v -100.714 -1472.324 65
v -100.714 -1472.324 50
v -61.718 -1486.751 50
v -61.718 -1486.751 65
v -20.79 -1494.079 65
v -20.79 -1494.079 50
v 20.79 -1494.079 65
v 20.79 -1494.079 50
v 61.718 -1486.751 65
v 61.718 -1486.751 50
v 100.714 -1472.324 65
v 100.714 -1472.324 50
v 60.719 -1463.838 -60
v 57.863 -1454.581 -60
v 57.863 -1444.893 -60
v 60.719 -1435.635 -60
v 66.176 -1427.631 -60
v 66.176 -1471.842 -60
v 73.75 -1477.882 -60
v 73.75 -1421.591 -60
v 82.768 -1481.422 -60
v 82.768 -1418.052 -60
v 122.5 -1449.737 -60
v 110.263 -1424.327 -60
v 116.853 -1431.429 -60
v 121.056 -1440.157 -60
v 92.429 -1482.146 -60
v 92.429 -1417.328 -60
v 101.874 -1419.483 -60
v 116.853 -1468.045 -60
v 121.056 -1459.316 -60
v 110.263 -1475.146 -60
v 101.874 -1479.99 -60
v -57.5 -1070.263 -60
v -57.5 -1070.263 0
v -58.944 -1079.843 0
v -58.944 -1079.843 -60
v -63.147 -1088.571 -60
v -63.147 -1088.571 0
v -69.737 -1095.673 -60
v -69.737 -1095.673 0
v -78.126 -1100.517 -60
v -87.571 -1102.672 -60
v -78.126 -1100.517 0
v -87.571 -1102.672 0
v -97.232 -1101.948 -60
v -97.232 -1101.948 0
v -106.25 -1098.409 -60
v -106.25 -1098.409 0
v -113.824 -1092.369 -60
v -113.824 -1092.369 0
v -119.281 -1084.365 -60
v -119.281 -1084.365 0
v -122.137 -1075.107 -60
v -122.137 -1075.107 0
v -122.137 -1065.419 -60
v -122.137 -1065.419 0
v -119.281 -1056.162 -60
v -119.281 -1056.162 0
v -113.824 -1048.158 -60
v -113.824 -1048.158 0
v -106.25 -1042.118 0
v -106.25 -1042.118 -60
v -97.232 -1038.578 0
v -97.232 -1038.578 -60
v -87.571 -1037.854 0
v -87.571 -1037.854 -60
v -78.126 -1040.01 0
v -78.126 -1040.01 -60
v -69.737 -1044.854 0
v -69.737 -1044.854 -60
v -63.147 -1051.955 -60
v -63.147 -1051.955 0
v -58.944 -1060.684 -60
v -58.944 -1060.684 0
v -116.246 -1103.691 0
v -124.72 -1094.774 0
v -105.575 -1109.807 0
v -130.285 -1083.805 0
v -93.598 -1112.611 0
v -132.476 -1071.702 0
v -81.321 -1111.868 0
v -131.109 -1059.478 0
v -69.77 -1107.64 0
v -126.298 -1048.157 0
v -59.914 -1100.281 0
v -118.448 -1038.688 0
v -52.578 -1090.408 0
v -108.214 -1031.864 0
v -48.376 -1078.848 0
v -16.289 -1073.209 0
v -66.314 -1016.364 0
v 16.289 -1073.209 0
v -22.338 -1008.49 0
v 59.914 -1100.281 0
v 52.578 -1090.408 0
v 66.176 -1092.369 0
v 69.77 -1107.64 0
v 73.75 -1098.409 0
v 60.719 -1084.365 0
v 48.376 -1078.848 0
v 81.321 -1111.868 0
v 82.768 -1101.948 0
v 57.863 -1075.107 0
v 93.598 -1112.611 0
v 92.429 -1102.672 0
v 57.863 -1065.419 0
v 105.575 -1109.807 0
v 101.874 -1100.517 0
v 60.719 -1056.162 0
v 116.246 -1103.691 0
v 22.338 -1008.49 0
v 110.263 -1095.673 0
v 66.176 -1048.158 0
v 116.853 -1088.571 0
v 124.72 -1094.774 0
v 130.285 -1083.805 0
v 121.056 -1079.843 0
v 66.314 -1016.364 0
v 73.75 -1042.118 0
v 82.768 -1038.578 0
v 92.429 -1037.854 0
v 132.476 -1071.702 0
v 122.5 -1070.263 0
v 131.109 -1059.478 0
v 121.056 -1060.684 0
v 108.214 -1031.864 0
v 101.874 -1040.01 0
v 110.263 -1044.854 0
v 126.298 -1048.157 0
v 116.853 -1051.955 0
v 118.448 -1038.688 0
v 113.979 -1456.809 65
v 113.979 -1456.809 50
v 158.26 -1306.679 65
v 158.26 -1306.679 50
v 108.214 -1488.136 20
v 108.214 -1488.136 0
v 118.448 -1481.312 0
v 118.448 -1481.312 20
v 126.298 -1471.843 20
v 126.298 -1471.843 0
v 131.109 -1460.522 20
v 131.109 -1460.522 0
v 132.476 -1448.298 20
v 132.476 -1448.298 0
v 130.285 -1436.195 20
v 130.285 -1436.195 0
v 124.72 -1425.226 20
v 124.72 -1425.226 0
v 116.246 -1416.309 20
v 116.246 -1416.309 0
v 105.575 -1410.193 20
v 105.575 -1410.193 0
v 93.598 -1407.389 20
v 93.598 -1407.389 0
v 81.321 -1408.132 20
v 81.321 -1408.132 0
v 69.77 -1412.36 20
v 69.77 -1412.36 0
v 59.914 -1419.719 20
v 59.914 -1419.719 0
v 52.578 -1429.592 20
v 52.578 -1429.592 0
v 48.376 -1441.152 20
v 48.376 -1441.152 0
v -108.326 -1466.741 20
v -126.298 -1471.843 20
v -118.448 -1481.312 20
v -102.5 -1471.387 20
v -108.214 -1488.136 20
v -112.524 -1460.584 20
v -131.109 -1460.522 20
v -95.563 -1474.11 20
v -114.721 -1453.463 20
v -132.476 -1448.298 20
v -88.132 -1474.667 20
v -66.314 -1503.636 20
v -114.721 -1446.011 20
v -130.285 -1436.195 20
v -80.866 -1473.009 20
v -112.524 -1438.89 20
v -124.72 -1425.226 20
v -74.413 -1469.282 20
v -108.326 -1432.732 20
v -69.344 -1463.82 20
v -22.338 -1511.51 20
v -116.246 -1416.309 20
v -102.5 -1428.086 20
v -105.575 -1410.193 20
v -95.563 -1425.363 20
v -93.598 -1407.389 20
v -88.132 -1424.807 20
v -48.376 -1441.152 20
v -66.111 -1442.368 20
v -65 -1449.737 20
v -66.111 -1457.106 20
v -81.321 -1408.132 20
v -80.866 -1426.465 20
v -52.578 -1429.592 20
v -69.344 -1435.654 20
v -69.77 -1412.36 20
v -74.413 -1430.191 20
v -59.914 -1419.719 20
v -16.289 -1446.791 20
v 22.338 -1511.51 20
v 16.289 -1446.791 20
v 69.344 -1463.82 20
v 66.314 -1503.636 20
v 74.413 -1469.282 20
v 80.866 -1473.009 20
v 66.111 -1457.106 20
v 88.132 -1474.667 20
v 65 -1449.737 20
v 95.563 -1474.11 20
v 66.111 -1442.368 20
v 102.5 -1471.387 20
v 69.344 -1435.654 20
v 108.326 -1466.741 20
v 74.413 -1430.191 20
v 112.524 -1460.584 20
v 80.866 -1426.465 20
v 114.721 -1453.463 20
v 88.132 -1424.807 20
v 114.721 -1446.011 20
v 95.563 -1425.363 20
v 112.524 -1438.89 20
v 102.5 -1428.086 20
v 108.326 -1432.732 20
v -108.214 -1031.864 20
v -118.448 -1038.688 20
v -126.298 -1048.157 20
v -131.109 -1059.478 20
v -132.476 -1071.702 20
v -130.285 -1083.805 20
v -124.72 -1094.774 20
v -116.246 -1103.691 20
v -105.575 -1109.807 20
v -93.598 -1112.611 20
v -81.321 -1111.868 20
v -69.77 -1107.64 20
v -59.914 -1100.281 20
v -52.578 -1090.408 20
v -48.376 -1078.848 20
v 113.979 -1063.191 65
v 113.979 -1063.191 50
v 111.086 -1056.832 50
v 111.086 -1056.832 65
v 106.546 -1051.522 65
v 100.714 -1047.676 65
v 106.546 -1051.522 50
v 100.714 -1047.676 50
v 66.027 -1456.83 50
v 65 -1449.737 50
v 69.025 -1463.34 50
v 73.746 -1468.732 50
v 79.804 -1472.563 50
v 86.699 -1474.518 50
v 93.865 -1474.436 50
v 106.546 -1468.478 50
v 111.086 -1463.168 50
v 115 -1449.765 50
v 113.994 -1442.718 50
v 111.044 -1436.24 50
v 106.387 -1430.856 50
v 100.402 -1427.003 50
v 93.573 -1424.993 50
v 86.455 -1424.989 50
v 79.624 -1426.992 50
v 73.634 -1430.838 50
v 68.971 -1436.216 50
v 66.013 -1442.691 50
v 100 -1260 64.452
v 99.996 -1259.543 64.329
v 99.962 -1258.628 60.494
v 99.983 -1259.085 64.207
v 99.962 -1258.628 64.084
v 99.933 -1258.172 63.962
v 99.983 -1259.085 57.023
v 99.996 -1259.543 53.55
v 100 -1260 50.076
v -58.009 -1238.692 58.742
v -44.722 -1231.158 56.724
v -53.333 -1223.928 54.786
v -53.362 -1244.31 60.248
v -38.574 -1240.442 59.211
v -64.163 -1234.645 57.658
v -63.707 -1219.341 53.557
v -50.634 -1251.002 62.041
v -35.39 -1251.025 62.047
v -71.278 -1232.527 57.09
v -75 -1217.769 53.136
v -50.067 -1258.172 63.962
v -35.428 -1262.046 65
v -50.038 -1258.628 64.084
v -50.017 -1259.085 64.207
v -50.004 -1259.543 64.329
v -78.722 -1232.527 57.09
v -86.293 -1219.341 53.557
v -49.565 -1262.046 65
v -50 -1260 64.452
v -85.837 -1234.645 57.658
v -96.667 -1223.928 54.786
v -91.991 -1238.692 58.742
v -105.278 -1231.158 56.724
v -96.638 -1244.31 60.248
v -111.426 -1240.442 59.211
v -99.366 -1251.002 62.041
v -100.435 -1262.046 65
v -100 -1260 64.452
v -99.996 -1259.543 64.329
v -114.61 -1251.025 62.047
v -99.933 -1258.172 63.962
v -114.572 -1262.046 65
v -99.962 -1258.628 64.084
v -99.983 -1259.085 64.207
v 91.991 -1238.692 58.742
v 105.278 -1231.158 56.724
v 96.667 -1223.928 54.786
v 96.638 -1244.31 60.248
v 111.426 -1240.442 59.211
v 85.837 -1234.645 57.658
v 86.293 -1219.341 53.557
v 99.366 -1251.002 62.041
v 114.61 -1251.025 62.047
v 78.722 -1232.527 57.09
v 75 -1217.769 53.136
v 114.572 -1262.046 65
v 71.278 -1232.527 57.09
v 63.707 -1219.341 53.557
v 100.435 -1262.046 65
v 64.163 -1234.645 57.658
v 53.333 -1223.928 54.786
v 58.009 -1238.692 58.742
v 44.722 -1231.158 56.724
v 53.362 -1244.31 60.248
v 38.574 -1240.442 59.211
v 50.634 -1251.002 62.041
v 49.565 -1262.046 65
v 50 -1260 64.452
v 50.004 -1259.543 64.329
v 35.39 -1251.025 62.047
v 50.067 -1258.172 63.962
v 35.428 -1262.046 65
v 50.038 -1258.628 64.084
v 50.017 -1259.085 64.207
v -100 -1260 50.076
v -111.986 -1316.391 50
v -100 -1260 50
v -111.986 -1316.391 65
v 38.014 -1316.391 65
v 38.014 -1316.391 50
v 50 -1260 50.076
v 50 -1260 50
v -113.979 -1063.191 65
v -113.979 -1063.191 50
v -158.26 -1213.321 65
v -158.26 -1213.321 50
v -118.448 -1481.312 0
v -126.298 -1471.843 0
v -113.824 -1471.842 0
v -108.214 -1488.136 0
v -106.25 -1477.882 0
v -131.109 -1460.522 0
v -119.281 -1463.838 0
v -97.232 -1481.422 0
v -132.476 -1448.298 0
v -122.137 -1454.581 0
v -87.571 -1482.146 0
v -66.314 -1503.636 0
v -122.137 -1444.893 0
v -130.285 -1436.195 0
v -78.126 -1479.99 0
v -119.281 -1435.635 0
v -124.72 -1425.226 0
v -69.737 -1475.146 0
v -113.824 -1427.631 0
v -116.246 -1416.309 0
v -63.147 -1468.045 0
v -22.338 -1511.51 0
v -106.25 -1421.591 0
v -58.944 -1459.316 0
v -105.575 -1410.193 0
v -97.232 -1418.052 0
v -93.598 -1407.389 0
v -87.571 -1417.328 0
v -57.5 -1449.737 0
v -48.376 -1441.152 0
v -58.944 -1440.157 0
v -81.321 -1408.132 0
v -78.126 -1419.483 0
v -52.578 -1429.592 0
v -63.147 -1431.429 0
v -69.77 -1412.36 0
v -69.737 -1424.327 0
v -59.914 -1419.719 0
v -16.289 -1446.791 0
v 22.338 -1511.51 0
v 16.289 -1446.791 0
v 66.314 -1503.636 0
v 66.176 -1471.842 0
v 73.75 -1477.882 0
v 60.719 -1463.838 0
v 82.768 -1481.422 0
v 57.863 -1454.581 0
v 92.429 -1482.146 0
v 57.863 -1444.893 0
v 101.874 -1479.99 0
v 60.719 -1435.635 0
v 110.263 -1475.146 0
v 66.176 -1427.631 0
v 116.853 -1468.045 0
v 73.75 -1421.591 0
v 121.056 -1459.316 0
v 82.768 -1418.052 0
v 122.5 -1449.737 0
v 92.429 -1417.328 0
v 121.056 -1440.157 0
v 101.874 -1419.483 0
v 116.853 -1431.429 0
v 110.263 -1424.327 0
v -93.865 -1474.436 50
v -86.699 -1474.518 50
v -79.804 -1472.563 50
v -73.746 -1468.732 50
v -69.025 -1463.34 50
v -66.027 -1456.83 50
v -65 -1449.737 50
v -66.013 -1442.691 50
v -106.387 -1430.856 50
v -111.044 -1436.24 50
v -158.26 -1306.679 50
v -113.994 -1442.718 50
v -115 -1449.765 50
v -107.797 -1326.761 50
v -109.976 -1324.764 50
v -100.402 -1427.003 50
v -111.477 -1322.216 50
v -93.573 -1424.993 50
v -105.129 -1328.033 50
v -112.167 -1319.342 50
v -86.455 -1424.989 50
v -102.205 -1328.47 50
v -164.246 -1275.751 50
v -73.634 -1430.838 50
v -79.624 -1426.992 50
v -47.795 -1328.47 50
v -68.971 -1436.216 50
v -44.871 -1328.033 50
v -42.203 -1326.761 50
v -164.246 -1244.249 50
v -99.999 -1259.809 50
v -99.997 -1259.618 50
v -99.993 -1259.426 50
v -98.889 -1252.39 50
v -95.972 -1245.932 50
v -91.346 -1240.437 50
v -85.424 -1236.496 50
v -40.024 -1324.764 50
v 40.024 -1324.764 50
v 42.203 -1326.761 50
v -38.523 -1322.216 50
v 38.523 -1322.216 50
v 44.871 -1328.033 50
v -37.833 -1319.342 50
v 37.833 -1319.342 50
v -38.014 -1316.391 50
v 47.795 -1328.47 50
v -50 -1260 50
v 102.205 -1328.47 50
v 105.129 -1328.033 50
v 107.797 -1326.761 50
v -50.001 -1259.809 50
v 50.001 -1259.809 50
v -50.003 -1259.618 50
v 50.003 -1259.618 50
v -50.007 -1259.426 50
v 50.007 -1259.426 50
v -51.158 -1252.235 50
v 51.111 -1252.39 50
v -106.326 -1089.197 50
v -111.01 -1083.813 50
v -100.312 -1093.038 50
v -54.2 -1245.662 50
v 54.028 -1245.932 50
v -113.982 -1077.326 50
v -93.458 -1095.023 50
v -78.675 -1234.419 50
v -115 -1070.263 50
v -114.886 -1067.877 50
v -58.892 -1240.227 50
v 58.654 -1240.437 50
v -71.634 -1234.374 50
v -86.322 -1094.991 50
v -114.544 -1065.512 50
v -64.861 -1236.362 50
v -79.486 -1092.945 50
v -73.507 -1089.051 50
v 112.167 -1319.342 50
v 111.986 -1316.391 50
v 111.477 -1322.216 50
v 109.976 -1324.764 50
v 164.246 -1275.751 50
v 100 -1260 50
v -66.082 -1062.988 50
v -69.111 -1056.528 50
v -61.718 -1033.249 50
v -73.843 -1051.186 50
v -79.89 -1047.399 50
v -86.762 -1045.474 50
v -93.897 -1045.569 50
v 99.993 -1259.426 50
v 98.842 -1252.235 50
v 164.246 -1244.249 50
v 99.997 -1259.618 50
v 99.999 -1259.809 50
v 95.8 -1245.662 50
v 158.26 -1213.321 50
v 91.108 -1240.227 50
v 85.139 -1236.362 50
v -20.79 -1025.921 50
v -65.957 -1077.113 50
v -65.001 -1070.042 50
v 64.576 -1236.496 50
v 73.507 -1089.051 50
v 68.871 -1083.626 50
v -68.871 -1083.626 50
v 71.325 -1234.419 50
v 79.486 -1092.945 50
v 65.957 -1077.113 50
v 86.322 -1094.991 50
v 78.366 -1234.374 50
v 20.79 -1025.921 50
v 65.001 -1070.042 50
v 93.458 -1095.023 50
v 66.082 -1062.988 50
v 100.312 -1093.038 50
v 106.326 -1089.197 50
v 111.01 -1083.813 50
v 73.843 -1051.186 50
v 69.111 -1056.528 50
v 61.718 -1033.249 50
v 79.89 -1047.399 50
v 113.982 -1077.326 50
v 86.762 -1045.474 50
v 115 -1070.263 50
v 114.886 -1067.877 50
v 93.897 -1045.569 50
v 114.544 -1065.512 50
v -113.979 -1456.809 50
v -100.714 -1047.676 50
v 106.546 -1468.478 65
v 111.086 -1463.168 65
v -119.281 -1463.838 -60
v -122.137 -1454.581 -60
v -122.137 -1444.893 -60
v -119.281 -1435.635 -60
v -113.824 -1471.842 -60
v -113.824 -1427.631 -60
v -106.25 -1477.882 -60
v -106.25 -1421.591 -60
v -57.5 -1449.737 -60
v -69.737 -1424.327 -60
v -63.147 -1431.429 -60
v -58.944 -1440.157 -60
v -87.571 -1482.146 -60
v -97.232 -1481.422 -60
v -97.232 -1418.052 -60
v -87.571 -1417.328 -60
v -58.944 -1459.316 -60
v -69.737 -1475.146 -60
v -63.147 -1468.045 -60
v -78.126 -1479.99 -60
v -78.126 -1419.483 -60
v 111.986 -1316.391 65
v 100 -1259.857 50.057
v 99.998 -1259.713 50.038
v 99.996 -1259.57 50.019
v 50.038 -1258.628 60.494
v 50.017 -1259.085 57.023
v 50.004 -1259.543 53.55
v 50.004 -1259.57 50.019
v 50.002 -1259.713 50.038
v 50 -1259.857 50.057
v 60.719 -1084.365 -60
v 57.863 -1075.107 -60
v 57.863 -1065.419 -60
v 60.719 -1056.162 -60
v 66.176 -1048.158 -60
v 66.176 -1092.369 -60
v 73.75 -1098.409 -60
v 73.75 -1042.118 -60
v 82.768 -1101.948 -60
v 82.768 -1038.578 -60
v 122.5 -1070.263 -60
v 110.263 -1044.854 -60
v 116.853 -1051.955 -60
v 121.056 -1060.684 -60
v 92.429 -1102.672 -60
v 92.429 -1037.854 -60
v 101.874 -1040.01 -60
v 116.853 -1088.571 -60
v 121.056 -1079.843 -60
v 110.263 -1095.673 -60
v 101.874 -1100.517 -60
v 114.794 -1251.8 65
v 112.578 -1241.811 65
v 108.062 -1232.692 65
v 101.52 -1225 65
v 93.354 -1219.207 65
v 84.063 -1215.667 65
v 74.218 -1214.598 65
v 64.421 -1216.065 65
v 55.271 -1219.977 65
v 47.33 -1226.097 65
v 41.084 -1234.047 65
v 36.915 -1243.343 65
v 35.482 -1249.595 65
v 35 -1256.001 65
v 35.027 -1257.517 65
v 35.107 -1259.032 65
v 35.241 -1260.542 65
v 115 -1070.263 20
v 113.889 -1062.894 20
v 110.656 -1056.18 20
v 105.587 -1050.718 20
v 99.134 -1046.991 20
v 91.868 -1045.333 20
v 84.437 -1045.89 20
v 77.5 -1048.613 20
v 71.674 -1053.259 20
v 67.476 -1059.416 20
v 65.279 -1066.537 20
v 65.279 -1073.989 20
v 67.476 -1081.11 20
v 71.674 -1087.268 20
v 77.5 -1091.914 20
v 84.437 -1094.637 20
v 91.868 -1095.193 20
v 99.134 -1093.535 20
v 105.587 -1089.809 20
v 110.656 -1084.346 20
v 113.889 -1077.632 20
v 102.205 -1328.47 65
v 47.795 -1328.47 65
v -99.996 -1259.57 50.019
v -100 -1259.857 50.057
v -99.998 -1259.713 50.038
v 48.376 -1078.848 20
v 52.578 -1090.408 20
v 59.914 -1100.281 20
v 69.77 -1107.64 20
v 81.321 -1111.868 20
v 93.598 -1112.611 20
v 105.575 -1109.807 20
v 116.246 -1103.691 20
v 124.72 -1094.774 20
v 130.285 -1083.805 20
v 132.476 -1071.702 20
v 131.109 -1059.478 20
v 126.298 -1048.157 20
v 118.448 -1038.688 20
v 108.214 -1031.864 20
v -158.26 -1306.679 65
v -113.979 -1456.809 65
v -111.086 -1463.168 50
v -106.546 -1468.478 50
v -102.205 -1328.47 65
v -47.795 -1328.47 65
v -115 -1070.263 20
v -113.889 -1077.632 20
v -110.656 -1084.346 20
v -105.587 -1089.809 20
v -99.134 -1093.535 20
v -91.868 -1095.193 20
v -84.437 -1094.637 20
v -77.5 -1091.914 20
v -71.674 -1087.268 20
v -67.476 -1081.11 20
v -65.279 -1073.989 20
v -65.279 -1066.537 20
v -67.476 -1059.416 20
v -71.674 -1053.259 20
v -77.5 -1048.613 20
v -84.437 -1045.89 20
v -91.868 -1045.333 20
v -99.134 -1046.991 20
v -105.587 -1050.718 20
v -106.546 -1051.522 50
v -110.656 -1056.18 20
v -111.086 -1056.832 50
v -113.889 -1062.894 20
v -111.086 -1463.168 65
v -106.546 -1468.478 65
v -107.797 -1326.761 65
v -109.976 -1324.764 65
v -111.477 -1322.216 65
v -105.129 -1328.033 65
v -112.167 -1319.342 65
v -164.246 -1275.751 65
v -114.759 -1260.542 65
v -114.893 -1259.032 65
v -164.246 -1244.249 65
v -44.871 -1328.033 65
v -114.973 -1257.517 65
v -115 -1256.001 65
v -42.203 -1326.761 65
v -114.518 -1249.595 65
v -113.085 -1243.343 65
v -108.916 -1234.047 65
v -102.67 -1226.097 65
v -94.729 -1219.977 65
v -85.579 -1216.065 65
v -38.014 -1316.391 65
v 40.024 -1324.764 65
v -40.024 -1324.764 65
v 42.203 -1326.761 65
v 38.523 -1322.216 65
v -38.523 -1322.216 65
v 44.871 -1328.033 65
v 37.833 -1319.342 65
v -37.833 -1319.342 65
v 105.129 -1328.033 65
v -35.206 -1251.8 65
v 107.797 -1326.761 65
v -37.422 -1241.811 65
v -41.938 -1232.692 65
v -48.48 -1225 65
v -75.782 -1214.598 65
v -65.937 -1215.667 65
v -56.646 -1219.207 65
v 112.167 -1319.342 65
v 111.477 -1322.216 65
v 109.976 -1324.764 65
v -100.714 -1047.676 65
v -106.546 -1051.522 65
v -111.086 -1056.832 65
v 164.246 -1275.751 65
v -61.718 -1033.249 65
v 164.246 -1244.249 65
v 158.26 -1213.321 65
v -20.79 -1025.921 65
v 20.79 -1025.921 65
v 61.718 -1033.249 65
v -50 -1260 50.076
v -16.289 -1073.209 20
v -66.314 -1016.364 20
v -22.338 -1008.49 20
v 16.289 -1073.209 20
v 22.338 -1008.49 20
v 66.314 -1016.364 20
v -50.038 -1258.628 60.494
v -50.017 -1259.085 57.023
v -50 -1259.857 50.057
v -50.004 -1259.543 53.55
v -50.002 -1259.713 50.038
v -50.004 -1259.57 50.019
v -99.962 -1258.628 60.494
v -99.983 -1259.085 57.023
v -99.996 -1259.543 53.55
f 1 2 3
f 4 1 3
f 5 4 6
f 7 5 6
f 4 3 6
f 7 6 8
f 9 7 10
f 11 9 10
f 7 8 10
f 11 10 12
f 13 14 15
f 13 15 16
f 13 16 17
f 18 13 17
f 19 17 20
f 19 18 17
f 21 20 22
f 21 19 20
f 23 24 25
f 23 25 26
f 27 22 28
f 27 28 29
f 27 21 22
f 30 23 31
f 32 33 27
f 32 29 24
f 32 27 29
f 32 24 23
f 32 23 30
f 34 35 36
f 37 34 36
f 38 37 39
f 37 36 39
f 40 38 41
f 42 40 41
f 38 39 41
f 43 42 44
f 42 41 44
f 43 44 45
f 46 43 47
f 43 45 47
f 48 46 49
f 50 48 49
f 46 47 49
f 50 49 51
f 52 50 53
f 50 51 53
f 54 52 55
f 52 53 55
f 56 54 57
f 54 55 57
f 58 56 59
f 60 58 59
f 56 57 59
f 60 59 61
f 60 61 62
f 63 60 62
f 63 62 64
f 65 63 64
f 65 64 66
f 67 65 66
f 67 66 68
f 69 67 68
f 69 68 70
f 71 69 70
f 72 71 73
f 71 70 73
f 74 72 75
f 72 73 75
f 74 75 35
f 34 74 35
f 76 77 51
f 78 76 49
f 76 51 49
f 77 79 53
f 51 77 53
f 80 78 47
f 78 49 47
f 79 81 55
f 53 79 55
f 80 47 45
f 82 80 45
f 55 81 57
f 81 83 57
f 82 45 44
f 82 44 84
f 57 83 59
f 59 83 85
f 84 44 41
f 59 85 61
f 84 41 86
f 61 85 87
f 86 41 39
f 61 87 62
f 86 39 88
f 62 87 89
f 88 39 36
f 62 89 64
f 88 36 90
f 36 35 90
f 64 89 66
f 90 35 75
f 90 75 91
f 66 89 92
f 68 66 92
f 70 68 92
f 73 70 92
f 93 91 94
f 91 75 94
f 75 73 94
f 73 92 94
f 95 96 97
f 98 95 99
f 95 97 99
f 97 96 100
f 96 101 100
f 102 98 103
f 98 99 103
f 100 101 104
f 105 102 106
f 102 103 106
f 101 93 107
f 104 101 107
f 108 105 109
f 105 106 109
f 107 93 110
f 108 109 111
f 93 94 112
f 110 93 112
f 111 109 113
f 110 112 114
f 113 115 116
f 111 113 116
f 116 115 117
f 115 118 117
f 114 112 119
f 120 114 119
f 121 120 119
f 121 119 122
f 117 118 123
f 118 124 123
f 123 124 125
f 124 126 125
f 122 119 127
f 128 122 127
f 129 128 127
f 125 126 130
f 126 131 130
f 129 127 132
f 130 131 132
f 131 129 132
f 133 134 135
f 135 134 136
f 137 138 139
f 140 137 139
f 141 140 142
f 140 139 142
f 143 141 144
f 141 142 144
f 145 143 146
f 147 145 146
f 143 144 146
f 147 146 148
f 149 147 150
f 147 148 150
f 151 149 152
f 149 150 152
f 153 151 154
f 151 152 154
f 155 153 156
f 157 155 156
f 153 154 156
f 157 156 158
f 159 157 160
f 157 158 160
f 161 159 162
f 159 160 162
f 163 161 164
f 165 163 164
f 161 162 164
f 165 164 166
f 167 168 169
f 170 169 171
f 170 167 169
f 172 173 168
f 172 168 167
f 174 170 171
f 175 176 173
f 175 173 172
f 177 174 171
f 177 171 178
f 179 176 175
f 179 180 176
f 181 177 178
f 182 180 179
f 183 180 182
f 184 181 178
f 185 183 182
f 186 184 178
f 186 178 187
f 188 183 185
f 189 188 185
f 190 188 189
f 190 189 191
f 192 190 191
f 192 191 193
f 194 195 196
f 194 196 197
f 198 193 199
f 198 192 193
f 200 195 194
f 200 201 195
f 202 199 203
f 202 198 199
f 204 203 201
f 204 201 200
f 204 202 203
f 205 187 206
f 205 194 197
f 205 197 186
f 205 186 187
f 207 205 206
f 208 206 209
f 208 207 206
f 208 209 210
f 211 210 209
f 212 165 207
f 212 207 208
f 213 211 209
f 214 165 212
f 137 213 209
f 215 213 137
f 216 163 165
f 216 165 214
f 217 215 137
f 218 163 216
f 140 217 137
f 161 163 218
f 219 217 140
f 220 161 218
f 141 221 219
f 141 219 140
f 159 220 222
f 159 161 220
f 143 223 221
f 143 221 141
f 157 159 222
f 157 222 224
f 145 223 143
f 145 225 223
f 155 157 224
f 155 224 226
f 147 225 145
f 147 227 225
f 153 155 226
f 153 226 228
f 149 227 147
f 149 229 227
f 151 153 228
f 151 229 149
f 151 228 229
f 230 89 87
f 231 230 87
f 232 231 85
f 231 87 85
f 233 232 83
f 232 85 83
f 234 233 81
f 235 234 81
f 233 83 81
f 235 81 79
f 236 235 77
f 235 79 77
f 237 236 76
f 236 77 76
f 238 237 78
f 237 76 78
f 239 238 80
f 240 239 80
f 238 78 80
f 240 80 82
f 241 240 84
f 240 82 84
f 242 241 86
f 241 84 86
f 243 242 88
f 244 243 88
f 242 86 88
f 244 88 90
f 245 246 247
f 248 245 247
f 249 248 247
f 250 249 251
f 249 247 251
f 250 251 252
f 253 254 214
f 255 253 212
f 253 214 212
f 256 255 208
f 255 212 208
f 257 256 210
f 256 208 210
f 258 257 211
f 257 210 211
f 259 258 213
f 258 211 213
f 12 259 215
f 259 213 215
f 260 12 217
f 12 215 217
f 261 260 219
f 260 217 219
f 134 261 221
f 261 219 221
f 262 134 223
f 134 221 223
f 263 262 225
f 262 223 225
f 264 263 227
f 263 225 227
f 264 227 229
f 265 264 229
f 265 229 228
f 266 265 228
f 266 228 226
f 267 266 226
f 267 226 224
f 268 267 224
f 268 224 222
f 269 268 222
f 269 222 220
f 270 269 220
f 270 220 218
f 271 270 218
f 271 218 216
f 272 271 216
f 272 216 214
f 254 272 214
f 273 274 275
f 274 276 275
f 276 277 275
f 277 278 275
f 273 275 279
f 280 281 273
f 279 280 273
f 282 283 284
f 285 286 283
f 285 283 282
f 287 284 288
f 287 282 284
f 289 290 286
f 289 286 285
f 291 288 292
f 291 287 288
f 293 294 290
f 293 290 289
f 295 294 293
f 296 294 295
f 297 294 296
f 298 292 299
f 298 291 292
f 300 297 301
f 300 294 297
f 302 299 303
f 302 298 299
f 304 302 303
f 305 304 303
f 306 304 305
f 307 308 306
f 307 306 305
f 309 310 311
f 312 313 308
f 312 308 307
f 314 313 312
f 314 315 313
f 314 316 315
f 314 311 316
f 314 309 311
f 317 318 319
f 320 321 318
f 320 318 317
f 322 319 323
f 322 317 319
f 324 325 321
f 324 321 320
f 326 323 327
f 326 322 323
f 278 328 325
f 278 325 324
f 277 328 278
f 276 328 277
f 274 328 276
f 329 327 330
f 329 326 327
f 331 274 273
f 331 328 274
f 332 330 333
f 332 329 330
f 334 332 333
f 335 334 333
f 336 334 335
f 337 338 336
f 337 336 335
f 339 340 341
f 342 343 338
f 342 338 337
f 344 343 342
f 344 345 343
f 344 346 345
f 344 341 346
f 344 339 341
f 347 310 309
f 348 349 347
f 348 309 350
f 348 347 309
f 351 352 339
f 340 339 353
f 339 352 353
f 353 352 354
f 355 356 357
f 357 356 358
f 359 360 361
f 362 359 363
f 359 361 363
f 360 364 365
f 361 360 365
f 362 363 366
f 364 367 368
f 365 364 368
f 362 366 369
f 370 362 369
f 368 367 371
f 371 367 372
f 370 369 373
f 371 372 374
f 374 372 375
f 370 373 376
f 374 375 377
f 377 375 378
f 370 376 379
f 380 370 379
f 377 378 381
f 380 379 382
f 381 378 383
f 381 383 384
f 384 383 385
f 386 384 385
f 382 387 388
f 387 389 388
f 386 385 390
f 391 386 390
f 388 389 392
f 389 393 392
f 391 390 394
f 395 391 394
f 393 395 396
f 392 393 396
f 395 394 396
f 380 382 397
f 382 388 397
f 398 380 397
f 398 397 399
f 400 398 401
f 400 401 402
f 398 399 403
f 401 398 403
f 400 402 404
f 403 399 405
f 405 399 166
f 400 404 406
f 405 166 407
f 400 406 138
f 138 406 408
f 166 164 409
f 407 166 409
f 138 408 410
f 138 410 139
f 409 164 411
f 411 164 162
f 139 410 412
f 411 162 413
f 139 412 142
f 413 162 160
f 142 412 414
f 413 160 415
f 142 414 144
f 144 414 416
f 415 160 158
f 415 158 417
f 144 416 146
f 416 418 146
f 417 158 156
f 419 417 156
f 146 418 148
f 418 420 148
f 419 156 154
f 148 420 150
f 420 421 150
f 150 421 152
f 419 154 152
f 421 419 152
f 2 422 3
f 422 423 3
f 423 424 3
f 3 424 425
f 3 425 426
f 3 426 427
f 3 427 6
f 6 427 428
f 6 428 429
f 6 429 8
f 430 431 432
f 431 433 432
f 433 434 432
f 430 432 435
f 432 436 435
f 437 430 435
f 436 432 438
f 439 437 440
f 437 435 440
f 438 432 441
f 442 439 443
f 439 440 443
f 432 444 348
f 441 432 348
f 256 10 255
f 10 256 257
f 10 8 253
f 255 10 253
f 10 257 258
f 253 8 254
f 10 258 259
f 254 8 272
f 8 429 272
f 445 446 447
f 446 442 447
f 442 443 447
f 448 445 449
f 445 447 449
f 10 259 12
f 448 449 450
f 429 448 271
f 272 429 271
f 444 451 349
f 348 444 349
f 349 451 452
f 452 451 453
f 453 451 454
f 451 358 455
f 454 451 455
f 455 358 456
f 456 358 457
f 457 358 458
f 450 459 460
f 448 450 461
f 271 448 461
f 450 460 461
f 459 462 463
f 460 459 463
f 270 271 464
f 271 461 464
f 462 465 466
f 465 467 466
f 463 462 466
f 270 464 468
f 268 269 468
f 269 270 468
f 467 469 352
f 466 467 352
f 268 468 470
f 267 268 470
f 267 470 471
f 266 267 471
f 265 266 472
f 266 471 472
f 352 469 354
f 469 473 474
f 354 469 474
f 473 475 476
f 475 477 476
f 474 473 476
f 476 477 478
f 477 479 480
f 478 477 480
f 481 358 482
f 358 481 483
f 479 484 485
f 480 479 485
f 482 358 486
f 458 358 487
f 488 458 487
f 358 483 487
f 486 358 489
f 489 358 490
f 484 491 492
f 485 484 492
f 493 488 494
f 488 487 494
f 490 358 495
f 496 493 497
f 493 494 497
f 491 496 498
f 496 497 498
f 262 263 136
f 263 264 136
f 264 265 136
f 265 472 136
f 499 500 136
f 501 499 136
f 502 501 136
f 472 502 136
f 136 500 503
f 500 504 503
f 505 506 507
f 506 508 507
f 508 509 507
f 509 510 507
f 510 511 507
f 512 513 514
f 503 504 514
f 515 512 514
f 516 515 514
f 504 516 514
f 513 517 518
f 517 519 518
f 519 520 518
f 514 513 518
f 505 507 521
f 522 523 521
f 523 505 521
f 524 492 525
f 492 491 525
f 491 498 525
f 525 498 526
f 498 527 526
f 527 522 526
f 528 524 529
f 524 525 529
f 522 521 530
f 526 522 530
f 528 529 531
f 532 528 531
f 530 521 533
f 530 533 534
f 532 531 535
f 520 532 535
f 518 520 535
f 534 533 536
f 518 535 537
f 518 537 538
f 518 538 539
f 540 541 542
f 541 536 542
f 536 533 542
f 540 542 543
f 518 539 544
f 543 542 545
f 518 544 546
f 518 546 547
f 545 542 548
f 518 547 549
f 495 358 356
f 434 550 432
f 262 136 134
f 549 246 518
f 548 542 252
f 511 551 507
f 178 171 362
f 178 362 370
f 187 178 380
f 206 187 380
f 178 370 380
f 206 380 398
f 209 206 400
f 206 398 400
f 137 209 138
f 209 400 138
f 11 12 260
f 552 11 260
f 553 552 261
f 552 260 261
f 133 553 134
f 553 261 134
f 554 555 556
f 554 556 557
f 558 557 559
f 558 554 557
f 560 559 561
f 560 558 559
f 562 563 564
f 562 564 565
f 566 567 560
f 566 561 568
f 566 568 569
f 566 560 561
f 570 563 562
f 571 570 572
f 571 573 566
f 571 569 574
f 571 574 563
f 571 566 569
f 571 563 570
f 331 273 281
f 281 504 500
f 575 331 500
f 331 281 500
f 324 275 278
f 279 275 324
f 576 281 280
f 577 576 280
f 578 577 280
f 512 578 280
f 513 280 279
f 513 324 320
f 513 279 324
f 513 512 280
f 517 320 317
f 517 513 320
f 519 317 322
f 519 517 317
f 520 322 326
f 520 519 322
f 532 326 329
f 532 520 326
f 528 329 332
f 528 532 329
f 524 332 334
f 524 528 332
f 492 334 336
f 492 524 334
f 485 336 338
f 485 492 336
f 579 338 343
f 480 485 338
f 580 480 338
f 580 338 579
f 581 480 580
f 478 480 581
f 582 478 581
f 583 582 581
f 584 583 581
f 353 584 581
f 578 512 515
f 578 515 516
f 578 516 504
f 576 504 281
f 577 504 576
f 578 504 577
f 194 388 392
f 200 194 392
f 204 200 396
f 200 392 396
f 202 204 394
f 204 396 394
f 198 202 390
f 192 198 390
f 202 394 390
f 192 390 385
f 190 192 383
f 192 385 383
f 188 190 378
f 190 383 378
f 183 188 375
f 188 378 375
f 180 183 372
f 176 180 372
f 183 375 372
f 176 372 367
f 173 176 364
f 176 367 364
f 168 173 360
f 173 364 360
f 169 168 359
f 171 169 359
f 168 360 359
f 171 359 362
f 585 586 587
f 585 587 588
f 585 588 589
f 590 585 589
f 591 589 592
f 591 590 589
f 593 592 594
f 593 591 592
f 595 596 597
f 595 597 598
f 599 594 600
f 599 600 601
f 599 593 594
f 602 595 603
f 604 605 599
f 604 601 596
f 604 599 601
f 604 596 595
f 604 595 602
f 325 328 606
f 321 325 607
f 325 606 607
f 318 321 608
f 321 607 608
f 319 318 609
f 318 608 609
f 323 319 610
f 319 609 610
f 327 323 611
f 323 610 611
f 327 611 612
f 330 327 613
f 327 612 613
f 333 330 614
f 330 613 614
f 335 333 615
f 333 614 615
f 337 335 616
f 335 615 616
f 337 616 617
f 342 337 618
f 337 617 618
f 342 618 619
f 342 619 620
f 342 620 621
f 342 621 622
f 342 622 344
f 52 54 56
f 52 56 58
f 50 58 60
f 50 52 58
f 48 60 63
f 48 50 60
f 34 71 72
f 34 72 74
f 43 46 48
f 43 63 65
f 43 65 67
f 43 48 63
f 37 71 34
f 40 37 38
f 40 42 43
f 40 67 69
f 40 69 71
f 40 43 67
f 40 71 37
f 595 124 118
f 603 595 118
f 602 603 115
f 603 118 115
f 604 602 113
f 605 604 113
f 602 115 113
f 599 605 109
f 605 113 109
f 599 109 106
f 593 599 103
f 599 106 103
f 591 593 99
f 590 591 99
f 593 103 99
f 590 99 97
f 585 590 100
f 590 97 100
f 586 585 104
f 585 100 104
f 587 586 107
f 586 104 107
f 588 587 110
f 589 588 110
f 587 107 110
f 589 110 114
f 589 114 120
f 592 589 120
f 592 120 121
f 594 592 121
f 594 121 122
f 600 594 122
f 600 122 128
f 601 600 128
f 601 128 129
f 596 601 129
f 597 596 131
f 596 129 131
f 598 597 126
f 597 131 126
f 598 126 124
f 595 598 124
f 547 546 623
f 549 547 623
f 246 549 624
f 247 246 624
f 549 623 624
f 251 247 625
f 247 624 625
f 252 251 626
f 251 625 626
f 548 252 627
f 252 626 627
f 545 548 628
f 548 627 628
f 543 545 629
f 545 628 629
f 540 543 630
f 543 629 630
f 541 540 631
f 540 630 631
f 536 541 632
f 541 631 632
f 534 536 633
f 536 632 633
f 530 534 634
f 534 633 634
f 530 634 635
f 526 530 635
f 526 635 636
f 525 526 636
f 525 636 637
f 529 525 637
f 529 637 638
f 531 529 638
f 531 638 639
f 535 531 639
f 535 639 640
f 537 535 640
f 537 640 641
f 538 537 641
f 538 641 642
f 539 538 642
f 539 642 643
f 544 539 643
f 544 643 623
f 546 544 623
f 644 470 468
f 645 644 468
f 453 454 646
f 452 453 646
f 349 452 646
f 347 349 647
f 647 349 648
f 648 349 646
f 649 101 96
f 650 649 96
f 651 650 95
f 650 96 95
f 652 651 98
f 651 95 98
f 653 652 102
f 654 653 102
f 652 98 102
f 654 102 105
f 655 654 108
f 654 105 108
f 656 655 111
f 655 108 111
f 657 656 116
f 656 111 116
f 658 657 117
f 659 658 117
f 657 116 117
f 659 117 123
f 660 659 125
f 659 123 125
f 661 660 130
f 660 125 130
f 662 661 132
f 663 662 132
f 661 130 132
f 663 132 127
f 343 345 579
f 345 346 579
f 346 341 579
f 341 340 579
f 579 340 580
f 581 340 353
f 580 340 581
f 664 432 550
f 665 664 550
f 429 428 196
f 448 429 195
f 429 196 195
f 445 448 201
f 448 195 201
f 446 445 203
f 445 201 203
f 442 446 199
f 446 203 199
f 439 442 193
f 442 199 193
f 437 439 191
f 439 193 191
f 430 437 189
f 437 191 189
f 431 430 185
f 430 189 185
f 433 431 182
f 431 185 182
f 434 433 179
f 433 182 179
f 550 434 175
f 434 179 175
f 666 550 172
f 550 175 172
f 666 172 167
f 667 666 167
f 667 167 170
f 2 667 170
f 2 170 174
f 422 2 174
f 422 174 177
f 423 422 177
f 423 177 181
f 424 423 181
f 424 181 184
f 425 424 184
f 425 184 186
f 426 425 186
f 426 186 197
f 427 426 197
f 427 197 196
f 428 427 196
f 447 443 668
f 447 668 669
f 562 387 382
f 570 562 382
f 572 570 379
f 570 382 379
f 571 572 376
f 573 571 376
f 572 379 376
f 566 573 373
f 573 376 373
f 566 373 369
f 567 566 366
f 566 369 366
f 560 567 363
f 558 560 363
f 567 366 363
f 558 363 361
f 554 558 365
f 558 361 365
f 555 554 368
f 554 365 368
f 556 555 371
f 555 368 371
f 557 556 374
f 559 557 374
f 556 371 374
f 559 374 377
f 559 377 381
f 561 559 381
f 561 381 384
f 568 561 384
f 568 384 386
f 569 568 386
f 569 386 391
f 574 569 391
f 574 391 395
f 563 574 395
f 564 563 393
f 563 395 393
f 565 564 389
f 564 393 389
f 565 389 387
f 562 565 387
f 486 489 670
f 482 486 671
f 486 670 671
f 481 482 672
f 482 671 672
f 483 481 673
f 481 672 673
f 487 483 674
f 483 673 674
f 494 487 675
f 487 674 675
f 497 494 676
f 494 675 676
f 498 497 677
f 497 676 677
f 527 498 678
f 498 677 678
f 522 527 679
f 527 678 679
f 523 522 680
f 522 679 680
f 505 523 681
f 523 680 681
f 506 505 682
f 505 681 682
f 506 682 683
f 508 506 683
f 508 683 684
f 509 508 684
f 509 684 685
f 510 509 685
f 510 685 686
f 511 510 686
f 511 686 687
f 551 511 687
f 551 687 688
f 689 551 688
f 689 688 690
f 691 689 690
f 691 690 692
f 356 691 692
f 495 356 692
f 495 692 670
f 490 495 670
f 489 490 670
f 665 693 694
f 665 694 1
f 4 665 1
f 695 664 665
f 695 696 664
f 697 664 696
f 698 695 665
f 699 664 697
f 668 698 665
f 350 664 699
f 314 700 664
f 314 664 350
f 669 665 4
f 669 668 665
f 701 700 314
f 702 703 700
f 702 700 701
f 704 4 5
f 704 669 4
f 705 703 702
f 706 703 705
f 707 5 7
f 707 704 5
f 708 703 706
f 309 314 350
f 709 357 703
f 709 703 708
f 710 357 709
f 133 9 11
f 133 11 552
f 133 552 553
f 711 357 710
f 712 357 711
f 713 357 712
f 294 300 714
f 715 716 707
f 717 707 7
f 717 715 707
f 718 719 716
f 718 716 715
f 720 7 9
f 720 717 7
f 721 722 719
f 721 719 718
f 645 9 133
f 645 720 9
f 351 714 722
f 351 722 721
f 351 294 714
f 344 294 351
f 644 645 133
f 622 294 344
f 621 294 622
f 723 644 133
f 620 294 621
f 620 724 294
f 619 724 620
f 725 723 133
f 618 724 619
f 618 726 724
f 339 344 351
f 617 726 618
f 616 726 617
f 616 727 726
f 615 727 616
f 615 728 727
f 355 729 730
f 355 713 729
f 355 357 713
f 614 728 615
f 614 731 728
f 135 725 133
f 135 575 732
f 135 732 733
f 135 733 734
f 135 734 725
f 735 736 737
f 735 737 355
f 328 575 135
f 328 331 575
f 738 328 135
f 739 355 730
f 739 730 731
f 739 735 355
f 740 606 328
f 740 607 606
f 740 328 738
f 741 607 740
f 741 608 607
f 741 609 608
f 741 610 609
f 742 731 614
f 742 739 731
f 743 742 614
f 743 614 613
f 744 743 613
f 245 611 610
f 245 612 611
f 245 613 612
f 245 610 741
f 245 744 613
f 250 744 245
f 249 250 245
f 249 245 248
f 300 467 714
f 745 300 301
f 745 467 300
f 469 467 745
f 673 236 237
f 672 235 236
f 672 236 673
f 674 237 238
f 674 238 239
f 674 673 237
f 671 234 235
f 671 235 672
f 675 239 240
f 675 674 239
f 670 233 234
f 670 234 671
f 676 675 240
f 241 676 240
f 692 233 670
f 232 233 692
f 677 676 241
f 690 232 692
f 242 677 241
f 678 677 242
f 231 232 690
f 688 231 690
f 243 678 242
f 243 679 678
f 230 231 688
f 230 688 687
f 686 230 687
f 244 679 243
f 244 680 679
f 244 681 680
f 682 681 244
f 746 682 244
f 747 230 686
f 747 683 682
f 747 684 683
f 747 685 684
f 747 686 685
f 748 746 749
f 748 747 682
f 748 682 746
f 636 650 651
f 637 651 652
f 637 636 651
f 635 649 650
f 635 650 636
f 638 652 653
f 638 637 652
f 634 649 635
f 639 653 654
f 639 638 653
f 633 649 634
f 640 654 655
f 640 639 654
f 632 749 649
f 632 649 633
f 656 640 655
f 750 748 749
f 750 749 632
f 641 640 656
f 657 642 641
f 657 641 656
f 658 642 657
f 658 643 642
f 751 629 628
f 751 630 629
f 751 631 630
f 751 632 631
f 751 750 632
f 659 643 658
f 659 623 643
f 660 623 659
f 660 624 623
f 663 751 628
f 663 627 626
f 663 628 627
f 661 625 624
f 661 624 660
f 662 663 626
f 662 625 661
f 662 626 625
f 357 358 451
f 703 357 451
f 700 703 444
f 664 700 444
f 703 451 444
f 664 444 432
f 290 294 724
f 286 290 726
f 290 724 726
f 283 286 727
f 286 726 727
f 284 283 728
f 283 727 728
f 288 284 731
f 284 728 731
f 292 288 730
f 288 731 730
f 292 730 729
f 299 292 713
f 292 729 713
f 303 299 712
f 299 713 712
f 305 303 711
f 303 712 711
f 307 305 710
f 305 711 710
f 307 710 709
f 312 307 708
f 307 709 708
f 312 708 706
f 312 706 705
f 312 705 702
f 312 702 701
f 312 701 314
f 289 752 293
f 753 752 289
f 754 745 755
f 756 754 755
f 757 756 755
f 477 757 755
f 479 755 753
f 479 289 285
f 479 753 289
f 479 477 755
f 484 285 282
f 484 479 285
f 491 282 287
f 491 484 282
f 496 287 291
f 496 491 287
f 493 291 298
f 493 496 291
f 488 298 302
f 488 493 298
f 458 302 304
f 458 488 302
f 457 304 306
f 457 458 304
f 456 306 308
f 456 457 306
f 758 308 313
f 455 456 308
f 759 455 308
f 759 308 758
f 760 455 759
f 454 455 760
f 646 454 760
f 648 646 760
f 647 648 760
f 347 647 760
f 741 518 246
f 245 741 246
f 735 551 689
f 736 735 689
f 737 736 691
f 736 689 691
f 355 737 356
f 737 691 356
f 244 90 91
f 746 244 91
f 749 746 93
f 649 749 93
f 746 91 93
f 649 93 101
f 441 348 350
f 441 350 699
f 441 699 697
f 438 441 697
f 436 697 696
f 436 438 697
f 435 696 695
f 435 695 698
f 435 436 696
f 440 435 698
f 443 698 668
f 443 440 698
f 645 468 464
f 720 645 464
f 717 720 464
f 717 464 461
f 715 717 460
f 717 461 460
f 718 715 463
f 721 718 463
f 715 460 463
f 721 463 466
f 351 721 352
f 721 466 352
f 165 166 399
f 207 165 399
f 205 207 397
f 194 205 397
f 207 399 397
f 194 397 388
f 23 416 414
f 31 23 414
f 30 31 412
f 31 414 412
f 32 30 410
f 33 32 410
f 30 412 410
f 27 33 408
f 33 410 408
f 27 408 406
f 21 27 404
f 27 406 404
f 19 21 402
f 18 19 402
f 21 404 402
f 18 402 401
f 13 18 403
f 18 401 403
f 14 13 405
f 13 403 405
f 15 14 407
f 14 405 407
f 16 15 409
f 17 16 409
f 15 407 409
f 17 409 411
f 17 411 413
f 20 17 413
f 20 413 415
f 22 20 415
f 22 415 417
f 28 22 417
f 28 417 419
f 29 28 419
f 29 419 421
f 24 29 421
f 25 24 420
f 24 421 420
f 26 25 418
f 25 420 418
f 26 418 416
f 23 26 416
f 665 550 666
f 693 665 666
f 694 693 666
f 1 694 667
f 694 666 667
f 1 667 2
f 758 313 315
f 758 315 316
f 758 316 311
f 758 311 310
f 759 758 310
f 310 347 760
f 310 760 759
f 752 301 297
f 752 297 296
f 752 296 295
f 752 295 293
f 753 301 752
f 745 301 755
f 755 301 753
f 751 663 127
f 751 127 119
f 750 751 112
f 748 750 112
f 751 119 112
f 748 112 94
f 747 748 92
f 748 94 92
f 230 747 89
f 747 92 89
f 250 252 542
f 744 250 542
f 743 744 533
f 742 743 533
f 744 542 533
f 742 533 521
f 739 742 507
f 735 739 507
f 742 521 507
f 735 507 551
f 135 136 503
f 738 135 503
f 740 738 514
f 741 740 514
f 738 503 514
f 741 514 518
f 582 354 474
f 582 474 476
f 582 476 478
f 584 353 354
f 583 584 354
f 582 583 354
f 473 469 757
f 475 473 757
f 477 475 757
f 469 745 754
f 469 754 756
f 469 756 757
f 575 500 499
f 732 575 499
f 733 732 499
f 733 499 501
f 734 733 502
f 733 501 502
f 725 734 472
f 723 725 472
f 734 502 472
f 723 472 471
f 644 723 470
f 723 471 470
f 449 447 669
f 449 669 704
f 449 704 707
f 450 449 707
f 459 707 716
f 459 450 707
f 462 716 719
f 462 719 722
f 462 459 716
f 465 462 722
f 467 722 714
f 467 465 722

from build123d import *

# Parameters (mm, degrees)
BOSS_EXTRUDE1_DEPTH     = 20
BOSS_EXTRUDE1_2_DEPTH   = 20
SKETCH2_R               = 25
BOSS_EXTRUDE2_DEPTH     = 30
BOSS_EXTRUDE3_DEPTH     = 15
CUT_EXTRUDE1_DEPTH      = 40
CUT_EXTRUDE1_DEPTH_BACK = 51
SKETCH4_R               = 25
SKETCH5_R               = 40
CUT_EXTRUDE2_DEPTH      = 27
SKETCH6_R               = 32.5
BOSS_EXTRUDE4_DEPTH     = 60


with BuildPart() as part:
    # Sketch1 → Boss-Extrude1 (new body)
    with BuildSketch(Plane.XY):
        with BuildLine():
            ThreePointArc((-108.214285714, -1031.864254516), (-116.246402213, -1103.690520511), (-48.376068528, -1078.848113469))
            ThreePointArc((-48.376068528, -1078.848113469), (0, -1072.5), (48.376068528, -1078.848113469))
            ThreePointArc((48.376068528, -1078.848113469), (116.246402213, -1103.690520511), (108.214285714, -1031.864254516))
            ThreePointArc((108.214285714, -1031.864254516), (0, -1007.5), (-108.214285714, -1031.864254516))
        make_face()
    extrude(amount=BOSS_EXTRUDE1_DEPTH)



with BuildPart() as body_2:
    # Sketch1 → Boss-Extrude1 2 (new body)
    with BuildSketch(Plane.XY):
        with BuildLine():
            ThreePointArc((108.214285714, -1488.135745484), (116.246402213, -1416.309479489), (48.376068528, -1441.151886531))
            ThreePointArc((48.376068528, -1441.151886531), (0, -1447.5), (-48.376068528, -1441.151886531))
            ThreePointArc((-48.376068528, -1441.151886531), (-116.246402213, -1416.309479489), (-108.214285714, -1488.135745484))
            ThreePointArc((-108.214285714, -1488.135745484), (0, -1512.5), (108.214285714, -1488.135745484))
        make_face()
    extrude(amount=BOSS_EXTRUDE1_2_DEPTH)


with BuildPart() as part_1:
    add(part.part)

    add(body_2.part)  # Boss-Extrude2 merges body 2
    # Sketch2 → Boss-Extrude2 (add)
    with BuildSketch(Plane.XY.offset(20)):
        with Locations((90, -1070.26334039)):
            Circle(SKETCH2_R)
        with Locations(Location((-90, -1070.26334039, 0), (0, 0, 180))):
            Circle(SKETCH2_R)
        with Locations((-90, -1449.73665961)):
            Circle(SKETCH2_R)
        with Locations(Location((90, -1449.73665961, 0), (0, 0, 180))):
            Circle(SKETCH2_R)
    extrude(amount=BOSS_EXTRUDE2_DEPTH)

    # Sketch3 → Boss-Extrude3 (add)
    with BuildSketch(Plane.XY.offset(50)):
        with BuildLine():
            Line((-113.978732885, -1063.190832404), (-158.259637044, -1213.321447293))
            ThreePointArc((-158.259637044, -1213.321447293), (-165, -1260), (-158.259637044, -1306.678552707))
            Line((-158.259637044, -1306.678552707), (-113.978732885, -1456.809167596))
            ThreePointArc((-113.978732885, -1456.809167596), (-109.002148875, -1465.982223255), (-100.714285714, -1472.324357183))
            ThreePointArc((-100.714285714, -1472.324357183), (0, -1495), (100.714285714, -1472.324357183))
            ThreePointArc((100.714285714, -1472.324357183), (109.002148875, -1465.982223255), (113.978732885, -1456.809167596))
            Line((113.978732885, -1456.809167596), (158.259637044, -1306.678552707))
            ThreePointArc((158.259637044, -1306.678552707), (165, -1260), (158.259637044, -1213.321447293))
            Line((158.259637044, -1213.321447293), (113.978732885, -1063.190832404))
            ThreePointArc((113.978732885, -1063.190832404), (109.002148875, -1054.017776745), (100.714285714, -1047.675642817))
            ThreePointArc((100.714285714, -1047.675642817), (0, -1025), (-100.714285714, -1047.675642817))
            ThreePointArc((-100.714285714, -1047.675642817), (-109.002148875, -1054.017776745), (-113.978732885, -1063.190832404))
        make_face()
        with BuildLine():
            Line((-100, -1260), (-111.986322799, -1316.391215143))
            ThreePointArc((-111.986322799, -1316.391215143), (-109.976306406, -1324.763535962), (-102.204846792, -1328.470332051))
            Line((-102.204846792, -1328.470332051), (-47.795153208, -1328.470332051))
            ThreePointArc((-47.795153208, -1328.470332051), (-40.023693594, -1324.763535962), (-38.013677201, -1316.391215143))
            Line((-38.013677201, -1316.391215143), (-50, -1260))
            ThreePointArc((-50, -1260), (-75, -1235), (-100, -1260))
        make_face(mode=Mode.SUBTRACT)
        with BuildLine():
            Line((100, -1260), (111.986322799, -1316.391215143))
            ThreePointArc((111.986322799, -1316.391215143), (109.976306406, -1324.763535962), (102.204846792, -1328.470332051))
            Line((102.204846792, -1328.470332051), (47.795153208, -1328.470332051))
            ThreePointArc((47.795153208, -1328.470332051), (40.023693594, -1324.763535962), (38.013677201, -1316.391215143))
            Line((38.013677201, -1316.391215143), (50, -1260))
            ThreePointArc((50, -1260), (75, -1235), (100, -1260))
        make_face(mode=Mode.SUBTRACT)
    extrude(amount=BOSS_EXTRUDE3_DEPTH)

    # Sketch4 → Cut-Extrude1 (cut, two sides: drawn at the far end of the back side and taken through both)
    with BuildSketch(Plane(origin=(0, -66.479313163, -248.104174377), x_dir=(-1, 0, 0), z_dir=(0, 0.25881904510252135, 0.9659258262890681)).offset(-CUT_EXTRUDE1_DEPTH_BACK)):
        with Locations((-75, 1230.027041119)):
            Circle(SKETCH4_R)
        with Locations((75, 1230.027041119)):
            Circle(SKETCH4_R)
    extrude(amount=CUT_EXTRUDE1_DEPTH + CUT_EXTRUDE1_DEPTH_BACK, mode=Mode.SUBTRACT)

    # Sketch5 → Cut-Extrude2 (cut)
    with BuildSketch(Plane(origin=(0, -61.302932261, -228.785657851), x_dir=(-1, 0, 0), z_dir=(0, 0.25881904510252135, 0.9659258262890681))):
        with Locations((-75, 1230.027041119)):
            Circle(SKETCH5_R)
        with Locations((75, 1230.027041119)):
            Circle(SKETCH5_R)
    extrude(amount=-CUT_EXTRUDE2_DEPTH, mode=Mode.SUBTRACT)

    # Sketch6 → Boss-Extrude4 (add)
    with BuildSketch(Plane(origin=(0, 0, 0), x_dir=(-1, 0, 0), z_dir=(0, 0, -1))):
        with Locations(Location((90, -1070.26334039, 0), (0, 0, 180))):
            Circle(SKETCH6_R)
        with Locations(Location((-90, -1070.26334039, 0), (0, 0, 180))):
            Circle(SKETCH6_R)
        with Locations(Location((-90, -1449.73665961, 0), (0, 0, 180))):
            Circle(SKETCH6_R)
        with Locations(Location((90, -1449.73665961, 0), (0, 0, 180))):
            Circle(SKETCH6_R)
    extrude(amount=BOSS_EXTRUDE4_DEPTH)


solid = part_1.part
